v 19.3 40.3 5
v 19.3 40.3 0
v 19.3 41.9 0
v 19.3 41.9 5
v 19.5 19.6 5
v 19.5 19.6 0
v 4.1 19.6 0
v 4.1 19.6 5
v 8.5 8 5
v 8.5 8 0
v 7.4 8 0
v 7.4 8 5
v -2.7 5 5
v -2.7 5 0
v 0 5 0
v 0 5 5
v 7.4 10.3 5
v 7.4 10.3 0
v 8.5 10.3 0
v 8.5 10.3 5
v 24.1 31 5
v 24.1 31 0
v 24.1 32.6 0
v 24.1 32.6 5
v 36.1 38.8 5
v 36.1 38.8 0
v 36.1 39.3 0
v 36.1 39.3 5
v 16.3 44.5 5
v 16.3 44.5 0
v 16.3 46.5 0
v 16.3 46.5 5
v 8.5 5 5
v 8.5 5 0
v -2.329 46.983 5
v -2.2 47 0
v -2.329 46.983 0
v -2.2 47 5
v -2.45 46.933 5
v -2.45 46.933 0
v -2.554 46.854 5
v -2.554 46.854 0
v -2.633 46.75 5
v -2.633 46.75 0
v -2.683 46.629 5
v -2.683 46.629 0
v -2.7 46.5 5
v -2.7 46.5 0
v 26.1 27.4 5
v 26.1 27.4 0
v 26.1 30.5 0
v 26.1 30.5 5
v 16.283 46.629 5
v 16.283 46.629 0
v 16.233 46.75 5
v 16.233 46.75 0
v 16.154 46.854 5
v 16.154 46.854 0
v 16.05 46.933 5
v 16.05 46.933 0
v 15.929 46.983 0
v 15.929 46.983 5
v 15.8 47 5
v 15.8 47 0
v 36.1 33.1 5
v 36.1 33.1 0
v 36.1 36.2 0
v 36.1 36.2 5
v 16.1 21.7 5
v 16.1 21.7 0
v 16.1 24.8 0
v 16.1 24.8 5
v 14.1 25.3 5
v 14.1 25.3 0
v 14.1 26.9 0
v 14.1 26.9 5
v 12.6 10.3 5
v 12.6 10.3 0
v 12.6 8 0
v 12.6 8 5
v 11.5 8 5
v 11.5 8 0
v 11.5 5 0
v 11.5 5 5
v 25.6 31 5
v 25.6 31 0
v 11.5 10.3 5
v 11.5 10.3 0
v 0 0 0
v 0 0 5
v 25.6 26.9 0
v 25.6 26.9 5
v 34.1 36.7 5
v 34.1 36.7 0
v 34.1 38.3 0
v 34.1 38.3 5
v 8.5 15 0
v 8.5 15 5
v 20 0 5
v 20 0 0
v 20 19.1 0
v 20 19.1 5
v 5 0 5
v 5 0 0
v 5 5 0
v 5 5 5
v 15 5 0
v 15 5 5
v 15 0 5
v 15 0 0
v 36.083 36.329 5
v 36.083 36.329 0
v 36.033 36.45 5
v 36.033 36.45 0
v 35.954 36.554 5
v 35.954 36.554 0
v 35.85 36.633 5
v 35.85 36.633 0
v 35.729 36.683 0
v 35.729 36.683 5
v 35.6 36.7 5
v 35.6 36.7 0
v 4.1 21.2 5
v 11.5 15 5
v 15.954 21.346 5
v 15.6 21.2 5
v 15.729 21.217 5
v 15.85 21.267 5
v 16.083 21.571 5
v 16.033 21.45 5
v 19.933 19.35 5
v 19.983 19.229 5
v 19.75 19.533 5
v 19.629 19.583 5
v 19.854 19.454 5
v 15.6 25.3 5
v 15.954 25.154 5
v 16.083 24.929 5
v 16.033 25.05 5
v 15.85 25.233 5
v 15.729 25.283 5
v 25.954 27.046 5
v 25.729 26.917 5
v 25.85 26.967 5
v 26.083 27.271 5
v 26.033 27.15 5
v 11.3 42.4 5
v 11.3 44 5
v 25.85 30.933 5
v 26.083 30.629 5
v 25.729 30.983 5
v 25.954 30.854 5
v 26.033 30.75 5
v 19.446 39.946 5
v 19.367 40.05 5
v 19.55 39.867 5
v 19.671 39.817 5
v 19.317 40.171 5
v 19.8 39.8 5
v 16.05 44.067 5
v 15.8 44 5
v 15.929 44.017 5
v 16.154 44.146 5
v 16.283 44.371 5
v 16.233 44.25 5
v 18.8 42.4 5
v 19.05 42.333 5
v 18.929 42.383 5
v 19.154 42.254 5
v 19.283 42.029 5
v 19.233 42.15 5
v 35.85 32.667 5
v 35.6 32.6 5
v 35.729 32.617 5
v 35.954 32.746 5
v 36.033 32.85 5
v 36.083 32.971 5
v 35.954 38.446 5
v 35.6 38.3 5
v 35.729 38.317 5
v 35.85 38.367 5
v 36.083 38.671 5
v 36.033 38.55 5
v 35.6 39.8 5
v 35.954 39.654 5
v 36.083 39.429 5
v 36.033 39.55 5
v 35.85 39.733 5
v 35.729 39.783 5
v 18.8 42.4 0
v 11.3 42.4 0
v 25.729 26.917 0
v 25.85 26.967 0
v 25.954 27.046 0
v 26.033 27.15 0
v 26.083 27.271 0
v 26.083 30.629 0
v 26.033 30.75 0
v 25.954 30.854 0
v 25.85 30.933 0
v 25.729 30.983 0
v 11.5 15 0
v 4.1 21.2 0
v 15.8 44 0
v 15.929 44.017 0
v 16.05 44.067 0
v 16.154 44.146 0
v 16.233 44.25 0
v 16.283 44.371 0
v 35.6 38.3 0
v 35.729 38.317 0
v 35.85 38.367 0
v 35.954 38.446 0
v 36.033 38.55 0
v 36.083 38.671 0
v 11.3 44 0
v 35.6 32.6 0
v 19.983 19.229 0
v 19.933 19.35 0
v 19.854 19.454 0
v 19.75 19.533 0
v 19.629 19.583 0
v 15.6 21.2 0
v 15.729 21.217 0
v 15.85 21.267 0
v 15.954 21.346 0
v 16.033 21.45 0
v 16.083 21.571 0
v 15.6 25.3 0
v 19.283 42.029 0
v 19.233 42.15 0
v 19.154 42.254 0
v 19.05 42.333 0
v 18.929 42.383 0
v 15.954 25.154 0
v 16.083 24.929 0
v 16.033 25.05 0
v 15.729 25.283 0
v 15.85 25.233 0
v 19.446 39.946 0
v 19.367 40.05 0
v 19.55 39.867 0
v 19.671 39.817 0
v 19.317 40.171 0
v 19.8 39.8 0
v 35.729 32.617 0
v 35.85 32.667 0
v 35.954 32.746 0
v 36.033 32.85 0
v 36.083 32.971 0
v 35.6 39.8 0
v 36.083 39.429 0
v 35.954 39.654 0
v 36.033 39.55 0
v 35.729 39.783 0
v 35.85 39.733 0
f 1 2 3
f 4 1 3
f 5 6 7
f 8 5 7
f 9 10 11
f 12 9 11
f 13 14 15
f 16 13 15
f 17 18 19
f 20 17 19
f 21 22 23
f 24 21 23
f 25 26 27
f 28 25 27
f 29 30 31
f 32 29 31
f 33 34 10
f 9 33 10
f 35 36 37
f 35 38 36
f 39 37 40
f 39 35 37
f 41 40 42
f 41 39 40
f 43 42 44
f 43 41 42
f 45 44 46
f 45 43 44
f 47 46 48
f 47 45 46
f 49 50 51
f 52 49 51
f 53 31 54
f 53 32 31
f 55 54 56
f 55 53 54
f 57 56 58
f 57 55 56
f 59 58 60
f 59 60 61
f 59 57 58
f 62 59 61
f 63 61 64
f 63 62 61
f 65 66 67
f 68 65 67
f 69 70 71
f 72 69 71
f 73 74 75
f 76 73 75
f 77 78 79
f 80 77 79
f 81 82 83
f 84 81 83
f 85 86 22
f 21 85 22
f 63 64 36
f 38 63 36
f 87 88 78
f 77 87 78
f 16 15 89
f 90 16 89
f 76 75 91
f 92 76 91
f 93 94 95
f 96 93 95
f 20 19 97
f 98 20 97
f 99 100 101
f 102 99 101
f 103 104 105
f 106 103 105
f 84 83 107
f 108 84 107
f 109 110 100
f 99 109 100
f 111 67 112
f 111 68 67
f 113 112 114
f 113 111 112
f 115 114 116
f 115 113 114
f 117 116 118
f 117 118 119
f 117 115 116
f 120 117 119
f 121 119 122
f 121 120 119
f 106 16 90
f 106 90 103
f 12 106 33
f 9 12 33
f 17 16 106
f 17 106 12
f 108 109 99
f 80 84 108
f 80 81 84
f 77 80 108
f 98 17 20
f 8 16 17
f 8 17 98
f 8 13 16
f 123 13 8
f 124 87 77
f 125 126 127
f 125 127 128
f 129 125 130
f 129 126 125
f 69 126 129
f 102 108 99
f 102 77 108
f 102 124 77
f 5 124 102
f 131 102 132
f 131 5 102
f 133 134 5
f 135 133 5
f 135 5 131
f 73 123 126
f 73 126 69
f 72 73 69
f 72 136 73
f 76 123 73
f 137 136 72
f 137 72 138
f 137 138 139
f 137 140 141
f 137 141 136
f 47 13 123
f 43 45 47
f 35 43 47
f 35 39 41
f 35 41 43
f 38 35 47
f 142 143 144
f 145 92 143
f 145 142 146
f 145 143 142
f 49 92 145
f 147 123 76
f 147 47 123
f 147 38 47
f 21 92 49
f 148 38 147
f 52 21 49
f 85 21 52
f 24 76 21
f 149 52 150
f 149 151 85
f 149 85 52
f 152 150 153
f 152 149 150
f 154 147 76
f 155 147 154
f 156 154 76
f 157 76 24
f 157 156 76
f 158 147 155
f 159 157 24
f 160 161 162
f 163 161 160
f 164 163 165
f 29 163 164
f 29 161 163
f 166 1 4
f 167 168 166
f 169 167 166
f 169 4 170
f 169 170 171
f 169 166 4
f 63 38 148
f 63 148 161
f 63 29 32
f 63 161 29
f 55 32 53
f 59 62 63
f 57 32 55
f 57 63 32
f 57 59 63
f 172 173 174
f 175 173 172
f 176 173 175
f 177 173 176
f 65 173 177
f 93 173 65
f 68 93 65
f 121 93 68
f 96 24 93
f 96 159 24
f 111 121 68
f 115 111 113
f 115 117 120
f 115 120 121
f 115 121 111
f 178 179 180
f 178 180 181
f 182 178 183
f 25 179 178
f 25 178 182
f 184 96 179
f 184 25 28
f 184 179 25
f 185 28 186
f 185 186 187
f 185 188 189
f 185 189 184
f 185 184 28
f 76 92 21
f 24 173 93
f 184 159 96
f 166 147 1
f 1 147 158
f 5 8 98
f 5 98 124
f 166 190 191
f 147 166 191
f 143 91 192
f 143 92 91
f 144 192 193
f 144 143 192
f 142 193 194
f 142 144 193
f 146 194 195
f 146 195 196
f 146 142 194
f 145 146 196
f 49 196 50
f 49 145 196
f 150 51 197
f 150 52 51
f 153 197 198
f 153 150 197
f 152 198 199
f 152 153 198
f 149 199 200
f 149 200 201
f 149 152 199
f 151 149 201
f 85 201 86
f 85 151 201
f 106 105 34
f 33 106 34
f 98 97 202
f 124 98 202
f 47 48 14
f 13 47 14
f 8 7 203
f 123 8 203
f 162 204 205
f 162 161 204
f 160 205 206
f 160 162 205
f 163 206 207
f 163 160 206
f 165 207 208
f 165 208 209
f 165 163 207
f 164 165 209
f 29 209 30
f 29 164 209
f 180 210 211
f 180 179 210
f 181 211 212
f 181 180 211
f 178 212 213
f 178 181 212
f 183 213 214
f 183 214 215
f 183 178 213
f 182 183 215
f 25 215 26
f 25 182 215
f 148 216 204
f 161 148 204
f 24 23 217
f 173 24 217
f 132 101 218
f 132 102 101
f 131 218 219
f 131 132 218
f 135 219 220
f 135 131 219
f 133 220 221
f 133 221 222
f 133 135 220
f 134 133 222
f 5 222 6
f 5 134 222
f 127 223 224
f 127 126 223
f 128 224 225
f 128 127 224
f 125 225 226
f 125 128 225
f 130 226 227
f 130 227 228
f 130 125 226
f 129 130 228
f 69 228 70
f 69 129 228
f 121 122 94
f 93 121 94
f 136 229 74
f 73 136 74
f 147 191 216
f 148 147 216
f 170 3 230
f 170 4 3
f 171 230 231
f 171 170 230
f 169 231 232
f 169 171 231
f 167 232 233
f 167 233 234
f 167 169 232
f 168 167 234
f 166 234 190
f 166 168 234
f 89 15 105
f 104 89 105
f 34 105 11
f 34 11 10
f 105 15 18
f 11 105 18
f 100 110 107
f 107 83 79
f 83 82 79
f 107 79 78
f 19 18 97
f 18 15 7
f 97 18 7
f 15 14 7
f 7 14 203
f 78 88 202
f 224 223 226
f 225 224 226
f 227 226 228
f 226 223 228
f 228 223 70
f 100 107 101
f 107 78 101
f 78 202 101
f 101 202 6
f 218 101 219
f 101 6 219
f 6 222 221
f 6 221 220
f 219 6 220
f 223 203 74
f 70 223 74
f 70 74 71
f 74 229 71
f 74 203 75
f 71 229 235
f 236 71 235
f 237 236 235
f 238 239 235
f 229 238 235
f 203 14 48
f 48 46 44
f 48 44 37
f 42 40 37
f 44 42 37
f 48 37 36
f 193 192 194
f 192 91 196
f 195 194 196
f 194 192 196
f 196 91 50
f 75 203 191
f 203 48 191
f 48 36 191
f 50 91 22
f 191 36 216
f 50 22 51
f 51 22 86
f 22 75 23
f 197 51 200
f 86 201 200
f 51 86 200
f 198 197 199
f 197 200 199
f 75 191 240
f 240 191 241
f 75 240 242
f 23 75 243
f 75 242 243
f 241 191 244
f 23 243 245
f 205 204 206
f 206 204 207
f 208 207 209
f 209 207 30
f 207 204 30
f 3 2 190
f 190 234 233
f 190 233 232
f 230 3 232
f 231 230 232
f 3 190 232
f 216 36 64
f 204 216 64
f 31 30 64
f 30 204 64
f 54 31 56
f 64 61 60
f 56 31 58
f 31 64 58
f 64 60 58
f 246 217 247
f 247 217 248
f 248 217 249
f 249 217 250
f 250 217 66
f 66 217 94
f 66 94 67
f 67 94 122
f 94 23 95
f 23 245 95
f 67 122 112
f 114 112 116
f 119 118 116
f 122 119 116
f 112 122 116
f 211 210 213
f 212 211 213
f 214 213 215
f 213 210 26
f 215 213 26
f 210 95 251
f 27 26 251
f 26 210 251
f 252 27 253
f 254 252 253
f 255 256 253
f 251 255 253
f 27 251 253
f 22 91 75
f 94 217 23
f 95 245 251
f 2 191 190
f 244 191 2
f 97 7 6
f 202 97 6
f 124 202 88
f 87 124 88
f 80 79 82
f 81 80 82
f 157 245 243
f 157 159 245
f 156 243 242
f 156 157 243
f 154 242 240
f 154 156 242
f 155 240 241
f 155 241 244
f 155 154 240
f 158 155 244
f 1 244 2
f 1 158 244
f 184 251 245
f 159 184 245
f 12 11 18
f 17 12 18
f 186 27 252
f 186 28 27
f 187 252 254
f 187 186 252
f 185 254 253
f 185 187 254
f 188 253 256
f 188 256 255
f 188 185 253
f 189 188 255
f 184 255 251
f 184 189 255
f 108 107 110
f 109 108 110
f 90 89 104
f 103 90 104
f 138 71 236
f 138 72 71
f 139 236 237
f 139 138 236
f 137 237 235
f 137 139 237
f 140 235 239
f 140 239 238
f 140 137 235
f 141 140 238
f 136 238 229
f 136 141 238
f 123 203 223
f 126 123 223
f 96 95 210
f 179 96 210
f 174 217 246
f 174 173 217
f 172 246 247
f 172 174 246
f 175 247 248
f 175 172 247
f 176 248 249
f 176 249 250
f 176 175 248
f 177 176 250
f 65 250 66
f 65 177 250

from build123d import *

# Parameters (mm, degrees)
BOSS_EXTRUDE1_DEPTH = 5
FILLET3_R           = 0.5


with BuildPart() as part:
    # Sketch1 → Boss-Extrude1 (new body)
    with BuildSketch(Plane.XY):
        Polygon((14.1, 25.3), (14.1, 26.9), (26.1, 26.9), (26.1, 31), (24.1, 31), (24.1, 32.6), (36.1, 32.6), (36.1, 36.7), (34.1, 36.7), (34.1, 38.3), (36.1, 38.3), (36.1, 39.8), (19.3, 39.8), (19.3, 42.4), (11.3, 42.4), (11.3, 44), (16.3, 44), (16.3, 47), (-2.7, 47), (-2.7, 5), (0, 5), (0, 0), (5, 0), (5, 5), (8.5, 5), (8.5, 8), (7.4, 8), (7.4, 10.3), (8.5, 10.3), (8.5, 15), (11.5, 15), (11.5, 10.3), (12.6, 10.3), (12.6, 8), (11.5, 8), (11.5, 5), (15, 5), (15, 0), (20, 0), (20, 5), (20, 19.6), (4.1, 19.6), (4.1, 21.2), (16.1, 21.2), (16.1, 25.3), align=None)
    extrude(amount=BOSS_EXTRUDE1_DEPTH)

    # Fillet3
    fillet3_edges = [part.edges().sort_by_distance(p)[0] for p in [
        (-2.7, 47, 2.5),
        (16.3, 47, 2.5),
        (16.3, 44, 2.5),
        (19.3, 42.4, 2.5),
        (19.3, 39.8, 2.5),
        (36.1, 39.8, 2.5),
        (36.1, 38.3, 2.5),
        (36.1, 36.7, 2.5),
        (36.1, 32.6, 2.5),
        (26.1, 31, 2.5),
        (26.1, 26.9, 2.5),
        (16.1, 25.3, 2.5),
        (16.1, 21.2, 2.5),
        (20, 19.6, 2.5),
    ]]
    fillet(fillet3_edges, radius=FILLET3_R)


solid = part.part
